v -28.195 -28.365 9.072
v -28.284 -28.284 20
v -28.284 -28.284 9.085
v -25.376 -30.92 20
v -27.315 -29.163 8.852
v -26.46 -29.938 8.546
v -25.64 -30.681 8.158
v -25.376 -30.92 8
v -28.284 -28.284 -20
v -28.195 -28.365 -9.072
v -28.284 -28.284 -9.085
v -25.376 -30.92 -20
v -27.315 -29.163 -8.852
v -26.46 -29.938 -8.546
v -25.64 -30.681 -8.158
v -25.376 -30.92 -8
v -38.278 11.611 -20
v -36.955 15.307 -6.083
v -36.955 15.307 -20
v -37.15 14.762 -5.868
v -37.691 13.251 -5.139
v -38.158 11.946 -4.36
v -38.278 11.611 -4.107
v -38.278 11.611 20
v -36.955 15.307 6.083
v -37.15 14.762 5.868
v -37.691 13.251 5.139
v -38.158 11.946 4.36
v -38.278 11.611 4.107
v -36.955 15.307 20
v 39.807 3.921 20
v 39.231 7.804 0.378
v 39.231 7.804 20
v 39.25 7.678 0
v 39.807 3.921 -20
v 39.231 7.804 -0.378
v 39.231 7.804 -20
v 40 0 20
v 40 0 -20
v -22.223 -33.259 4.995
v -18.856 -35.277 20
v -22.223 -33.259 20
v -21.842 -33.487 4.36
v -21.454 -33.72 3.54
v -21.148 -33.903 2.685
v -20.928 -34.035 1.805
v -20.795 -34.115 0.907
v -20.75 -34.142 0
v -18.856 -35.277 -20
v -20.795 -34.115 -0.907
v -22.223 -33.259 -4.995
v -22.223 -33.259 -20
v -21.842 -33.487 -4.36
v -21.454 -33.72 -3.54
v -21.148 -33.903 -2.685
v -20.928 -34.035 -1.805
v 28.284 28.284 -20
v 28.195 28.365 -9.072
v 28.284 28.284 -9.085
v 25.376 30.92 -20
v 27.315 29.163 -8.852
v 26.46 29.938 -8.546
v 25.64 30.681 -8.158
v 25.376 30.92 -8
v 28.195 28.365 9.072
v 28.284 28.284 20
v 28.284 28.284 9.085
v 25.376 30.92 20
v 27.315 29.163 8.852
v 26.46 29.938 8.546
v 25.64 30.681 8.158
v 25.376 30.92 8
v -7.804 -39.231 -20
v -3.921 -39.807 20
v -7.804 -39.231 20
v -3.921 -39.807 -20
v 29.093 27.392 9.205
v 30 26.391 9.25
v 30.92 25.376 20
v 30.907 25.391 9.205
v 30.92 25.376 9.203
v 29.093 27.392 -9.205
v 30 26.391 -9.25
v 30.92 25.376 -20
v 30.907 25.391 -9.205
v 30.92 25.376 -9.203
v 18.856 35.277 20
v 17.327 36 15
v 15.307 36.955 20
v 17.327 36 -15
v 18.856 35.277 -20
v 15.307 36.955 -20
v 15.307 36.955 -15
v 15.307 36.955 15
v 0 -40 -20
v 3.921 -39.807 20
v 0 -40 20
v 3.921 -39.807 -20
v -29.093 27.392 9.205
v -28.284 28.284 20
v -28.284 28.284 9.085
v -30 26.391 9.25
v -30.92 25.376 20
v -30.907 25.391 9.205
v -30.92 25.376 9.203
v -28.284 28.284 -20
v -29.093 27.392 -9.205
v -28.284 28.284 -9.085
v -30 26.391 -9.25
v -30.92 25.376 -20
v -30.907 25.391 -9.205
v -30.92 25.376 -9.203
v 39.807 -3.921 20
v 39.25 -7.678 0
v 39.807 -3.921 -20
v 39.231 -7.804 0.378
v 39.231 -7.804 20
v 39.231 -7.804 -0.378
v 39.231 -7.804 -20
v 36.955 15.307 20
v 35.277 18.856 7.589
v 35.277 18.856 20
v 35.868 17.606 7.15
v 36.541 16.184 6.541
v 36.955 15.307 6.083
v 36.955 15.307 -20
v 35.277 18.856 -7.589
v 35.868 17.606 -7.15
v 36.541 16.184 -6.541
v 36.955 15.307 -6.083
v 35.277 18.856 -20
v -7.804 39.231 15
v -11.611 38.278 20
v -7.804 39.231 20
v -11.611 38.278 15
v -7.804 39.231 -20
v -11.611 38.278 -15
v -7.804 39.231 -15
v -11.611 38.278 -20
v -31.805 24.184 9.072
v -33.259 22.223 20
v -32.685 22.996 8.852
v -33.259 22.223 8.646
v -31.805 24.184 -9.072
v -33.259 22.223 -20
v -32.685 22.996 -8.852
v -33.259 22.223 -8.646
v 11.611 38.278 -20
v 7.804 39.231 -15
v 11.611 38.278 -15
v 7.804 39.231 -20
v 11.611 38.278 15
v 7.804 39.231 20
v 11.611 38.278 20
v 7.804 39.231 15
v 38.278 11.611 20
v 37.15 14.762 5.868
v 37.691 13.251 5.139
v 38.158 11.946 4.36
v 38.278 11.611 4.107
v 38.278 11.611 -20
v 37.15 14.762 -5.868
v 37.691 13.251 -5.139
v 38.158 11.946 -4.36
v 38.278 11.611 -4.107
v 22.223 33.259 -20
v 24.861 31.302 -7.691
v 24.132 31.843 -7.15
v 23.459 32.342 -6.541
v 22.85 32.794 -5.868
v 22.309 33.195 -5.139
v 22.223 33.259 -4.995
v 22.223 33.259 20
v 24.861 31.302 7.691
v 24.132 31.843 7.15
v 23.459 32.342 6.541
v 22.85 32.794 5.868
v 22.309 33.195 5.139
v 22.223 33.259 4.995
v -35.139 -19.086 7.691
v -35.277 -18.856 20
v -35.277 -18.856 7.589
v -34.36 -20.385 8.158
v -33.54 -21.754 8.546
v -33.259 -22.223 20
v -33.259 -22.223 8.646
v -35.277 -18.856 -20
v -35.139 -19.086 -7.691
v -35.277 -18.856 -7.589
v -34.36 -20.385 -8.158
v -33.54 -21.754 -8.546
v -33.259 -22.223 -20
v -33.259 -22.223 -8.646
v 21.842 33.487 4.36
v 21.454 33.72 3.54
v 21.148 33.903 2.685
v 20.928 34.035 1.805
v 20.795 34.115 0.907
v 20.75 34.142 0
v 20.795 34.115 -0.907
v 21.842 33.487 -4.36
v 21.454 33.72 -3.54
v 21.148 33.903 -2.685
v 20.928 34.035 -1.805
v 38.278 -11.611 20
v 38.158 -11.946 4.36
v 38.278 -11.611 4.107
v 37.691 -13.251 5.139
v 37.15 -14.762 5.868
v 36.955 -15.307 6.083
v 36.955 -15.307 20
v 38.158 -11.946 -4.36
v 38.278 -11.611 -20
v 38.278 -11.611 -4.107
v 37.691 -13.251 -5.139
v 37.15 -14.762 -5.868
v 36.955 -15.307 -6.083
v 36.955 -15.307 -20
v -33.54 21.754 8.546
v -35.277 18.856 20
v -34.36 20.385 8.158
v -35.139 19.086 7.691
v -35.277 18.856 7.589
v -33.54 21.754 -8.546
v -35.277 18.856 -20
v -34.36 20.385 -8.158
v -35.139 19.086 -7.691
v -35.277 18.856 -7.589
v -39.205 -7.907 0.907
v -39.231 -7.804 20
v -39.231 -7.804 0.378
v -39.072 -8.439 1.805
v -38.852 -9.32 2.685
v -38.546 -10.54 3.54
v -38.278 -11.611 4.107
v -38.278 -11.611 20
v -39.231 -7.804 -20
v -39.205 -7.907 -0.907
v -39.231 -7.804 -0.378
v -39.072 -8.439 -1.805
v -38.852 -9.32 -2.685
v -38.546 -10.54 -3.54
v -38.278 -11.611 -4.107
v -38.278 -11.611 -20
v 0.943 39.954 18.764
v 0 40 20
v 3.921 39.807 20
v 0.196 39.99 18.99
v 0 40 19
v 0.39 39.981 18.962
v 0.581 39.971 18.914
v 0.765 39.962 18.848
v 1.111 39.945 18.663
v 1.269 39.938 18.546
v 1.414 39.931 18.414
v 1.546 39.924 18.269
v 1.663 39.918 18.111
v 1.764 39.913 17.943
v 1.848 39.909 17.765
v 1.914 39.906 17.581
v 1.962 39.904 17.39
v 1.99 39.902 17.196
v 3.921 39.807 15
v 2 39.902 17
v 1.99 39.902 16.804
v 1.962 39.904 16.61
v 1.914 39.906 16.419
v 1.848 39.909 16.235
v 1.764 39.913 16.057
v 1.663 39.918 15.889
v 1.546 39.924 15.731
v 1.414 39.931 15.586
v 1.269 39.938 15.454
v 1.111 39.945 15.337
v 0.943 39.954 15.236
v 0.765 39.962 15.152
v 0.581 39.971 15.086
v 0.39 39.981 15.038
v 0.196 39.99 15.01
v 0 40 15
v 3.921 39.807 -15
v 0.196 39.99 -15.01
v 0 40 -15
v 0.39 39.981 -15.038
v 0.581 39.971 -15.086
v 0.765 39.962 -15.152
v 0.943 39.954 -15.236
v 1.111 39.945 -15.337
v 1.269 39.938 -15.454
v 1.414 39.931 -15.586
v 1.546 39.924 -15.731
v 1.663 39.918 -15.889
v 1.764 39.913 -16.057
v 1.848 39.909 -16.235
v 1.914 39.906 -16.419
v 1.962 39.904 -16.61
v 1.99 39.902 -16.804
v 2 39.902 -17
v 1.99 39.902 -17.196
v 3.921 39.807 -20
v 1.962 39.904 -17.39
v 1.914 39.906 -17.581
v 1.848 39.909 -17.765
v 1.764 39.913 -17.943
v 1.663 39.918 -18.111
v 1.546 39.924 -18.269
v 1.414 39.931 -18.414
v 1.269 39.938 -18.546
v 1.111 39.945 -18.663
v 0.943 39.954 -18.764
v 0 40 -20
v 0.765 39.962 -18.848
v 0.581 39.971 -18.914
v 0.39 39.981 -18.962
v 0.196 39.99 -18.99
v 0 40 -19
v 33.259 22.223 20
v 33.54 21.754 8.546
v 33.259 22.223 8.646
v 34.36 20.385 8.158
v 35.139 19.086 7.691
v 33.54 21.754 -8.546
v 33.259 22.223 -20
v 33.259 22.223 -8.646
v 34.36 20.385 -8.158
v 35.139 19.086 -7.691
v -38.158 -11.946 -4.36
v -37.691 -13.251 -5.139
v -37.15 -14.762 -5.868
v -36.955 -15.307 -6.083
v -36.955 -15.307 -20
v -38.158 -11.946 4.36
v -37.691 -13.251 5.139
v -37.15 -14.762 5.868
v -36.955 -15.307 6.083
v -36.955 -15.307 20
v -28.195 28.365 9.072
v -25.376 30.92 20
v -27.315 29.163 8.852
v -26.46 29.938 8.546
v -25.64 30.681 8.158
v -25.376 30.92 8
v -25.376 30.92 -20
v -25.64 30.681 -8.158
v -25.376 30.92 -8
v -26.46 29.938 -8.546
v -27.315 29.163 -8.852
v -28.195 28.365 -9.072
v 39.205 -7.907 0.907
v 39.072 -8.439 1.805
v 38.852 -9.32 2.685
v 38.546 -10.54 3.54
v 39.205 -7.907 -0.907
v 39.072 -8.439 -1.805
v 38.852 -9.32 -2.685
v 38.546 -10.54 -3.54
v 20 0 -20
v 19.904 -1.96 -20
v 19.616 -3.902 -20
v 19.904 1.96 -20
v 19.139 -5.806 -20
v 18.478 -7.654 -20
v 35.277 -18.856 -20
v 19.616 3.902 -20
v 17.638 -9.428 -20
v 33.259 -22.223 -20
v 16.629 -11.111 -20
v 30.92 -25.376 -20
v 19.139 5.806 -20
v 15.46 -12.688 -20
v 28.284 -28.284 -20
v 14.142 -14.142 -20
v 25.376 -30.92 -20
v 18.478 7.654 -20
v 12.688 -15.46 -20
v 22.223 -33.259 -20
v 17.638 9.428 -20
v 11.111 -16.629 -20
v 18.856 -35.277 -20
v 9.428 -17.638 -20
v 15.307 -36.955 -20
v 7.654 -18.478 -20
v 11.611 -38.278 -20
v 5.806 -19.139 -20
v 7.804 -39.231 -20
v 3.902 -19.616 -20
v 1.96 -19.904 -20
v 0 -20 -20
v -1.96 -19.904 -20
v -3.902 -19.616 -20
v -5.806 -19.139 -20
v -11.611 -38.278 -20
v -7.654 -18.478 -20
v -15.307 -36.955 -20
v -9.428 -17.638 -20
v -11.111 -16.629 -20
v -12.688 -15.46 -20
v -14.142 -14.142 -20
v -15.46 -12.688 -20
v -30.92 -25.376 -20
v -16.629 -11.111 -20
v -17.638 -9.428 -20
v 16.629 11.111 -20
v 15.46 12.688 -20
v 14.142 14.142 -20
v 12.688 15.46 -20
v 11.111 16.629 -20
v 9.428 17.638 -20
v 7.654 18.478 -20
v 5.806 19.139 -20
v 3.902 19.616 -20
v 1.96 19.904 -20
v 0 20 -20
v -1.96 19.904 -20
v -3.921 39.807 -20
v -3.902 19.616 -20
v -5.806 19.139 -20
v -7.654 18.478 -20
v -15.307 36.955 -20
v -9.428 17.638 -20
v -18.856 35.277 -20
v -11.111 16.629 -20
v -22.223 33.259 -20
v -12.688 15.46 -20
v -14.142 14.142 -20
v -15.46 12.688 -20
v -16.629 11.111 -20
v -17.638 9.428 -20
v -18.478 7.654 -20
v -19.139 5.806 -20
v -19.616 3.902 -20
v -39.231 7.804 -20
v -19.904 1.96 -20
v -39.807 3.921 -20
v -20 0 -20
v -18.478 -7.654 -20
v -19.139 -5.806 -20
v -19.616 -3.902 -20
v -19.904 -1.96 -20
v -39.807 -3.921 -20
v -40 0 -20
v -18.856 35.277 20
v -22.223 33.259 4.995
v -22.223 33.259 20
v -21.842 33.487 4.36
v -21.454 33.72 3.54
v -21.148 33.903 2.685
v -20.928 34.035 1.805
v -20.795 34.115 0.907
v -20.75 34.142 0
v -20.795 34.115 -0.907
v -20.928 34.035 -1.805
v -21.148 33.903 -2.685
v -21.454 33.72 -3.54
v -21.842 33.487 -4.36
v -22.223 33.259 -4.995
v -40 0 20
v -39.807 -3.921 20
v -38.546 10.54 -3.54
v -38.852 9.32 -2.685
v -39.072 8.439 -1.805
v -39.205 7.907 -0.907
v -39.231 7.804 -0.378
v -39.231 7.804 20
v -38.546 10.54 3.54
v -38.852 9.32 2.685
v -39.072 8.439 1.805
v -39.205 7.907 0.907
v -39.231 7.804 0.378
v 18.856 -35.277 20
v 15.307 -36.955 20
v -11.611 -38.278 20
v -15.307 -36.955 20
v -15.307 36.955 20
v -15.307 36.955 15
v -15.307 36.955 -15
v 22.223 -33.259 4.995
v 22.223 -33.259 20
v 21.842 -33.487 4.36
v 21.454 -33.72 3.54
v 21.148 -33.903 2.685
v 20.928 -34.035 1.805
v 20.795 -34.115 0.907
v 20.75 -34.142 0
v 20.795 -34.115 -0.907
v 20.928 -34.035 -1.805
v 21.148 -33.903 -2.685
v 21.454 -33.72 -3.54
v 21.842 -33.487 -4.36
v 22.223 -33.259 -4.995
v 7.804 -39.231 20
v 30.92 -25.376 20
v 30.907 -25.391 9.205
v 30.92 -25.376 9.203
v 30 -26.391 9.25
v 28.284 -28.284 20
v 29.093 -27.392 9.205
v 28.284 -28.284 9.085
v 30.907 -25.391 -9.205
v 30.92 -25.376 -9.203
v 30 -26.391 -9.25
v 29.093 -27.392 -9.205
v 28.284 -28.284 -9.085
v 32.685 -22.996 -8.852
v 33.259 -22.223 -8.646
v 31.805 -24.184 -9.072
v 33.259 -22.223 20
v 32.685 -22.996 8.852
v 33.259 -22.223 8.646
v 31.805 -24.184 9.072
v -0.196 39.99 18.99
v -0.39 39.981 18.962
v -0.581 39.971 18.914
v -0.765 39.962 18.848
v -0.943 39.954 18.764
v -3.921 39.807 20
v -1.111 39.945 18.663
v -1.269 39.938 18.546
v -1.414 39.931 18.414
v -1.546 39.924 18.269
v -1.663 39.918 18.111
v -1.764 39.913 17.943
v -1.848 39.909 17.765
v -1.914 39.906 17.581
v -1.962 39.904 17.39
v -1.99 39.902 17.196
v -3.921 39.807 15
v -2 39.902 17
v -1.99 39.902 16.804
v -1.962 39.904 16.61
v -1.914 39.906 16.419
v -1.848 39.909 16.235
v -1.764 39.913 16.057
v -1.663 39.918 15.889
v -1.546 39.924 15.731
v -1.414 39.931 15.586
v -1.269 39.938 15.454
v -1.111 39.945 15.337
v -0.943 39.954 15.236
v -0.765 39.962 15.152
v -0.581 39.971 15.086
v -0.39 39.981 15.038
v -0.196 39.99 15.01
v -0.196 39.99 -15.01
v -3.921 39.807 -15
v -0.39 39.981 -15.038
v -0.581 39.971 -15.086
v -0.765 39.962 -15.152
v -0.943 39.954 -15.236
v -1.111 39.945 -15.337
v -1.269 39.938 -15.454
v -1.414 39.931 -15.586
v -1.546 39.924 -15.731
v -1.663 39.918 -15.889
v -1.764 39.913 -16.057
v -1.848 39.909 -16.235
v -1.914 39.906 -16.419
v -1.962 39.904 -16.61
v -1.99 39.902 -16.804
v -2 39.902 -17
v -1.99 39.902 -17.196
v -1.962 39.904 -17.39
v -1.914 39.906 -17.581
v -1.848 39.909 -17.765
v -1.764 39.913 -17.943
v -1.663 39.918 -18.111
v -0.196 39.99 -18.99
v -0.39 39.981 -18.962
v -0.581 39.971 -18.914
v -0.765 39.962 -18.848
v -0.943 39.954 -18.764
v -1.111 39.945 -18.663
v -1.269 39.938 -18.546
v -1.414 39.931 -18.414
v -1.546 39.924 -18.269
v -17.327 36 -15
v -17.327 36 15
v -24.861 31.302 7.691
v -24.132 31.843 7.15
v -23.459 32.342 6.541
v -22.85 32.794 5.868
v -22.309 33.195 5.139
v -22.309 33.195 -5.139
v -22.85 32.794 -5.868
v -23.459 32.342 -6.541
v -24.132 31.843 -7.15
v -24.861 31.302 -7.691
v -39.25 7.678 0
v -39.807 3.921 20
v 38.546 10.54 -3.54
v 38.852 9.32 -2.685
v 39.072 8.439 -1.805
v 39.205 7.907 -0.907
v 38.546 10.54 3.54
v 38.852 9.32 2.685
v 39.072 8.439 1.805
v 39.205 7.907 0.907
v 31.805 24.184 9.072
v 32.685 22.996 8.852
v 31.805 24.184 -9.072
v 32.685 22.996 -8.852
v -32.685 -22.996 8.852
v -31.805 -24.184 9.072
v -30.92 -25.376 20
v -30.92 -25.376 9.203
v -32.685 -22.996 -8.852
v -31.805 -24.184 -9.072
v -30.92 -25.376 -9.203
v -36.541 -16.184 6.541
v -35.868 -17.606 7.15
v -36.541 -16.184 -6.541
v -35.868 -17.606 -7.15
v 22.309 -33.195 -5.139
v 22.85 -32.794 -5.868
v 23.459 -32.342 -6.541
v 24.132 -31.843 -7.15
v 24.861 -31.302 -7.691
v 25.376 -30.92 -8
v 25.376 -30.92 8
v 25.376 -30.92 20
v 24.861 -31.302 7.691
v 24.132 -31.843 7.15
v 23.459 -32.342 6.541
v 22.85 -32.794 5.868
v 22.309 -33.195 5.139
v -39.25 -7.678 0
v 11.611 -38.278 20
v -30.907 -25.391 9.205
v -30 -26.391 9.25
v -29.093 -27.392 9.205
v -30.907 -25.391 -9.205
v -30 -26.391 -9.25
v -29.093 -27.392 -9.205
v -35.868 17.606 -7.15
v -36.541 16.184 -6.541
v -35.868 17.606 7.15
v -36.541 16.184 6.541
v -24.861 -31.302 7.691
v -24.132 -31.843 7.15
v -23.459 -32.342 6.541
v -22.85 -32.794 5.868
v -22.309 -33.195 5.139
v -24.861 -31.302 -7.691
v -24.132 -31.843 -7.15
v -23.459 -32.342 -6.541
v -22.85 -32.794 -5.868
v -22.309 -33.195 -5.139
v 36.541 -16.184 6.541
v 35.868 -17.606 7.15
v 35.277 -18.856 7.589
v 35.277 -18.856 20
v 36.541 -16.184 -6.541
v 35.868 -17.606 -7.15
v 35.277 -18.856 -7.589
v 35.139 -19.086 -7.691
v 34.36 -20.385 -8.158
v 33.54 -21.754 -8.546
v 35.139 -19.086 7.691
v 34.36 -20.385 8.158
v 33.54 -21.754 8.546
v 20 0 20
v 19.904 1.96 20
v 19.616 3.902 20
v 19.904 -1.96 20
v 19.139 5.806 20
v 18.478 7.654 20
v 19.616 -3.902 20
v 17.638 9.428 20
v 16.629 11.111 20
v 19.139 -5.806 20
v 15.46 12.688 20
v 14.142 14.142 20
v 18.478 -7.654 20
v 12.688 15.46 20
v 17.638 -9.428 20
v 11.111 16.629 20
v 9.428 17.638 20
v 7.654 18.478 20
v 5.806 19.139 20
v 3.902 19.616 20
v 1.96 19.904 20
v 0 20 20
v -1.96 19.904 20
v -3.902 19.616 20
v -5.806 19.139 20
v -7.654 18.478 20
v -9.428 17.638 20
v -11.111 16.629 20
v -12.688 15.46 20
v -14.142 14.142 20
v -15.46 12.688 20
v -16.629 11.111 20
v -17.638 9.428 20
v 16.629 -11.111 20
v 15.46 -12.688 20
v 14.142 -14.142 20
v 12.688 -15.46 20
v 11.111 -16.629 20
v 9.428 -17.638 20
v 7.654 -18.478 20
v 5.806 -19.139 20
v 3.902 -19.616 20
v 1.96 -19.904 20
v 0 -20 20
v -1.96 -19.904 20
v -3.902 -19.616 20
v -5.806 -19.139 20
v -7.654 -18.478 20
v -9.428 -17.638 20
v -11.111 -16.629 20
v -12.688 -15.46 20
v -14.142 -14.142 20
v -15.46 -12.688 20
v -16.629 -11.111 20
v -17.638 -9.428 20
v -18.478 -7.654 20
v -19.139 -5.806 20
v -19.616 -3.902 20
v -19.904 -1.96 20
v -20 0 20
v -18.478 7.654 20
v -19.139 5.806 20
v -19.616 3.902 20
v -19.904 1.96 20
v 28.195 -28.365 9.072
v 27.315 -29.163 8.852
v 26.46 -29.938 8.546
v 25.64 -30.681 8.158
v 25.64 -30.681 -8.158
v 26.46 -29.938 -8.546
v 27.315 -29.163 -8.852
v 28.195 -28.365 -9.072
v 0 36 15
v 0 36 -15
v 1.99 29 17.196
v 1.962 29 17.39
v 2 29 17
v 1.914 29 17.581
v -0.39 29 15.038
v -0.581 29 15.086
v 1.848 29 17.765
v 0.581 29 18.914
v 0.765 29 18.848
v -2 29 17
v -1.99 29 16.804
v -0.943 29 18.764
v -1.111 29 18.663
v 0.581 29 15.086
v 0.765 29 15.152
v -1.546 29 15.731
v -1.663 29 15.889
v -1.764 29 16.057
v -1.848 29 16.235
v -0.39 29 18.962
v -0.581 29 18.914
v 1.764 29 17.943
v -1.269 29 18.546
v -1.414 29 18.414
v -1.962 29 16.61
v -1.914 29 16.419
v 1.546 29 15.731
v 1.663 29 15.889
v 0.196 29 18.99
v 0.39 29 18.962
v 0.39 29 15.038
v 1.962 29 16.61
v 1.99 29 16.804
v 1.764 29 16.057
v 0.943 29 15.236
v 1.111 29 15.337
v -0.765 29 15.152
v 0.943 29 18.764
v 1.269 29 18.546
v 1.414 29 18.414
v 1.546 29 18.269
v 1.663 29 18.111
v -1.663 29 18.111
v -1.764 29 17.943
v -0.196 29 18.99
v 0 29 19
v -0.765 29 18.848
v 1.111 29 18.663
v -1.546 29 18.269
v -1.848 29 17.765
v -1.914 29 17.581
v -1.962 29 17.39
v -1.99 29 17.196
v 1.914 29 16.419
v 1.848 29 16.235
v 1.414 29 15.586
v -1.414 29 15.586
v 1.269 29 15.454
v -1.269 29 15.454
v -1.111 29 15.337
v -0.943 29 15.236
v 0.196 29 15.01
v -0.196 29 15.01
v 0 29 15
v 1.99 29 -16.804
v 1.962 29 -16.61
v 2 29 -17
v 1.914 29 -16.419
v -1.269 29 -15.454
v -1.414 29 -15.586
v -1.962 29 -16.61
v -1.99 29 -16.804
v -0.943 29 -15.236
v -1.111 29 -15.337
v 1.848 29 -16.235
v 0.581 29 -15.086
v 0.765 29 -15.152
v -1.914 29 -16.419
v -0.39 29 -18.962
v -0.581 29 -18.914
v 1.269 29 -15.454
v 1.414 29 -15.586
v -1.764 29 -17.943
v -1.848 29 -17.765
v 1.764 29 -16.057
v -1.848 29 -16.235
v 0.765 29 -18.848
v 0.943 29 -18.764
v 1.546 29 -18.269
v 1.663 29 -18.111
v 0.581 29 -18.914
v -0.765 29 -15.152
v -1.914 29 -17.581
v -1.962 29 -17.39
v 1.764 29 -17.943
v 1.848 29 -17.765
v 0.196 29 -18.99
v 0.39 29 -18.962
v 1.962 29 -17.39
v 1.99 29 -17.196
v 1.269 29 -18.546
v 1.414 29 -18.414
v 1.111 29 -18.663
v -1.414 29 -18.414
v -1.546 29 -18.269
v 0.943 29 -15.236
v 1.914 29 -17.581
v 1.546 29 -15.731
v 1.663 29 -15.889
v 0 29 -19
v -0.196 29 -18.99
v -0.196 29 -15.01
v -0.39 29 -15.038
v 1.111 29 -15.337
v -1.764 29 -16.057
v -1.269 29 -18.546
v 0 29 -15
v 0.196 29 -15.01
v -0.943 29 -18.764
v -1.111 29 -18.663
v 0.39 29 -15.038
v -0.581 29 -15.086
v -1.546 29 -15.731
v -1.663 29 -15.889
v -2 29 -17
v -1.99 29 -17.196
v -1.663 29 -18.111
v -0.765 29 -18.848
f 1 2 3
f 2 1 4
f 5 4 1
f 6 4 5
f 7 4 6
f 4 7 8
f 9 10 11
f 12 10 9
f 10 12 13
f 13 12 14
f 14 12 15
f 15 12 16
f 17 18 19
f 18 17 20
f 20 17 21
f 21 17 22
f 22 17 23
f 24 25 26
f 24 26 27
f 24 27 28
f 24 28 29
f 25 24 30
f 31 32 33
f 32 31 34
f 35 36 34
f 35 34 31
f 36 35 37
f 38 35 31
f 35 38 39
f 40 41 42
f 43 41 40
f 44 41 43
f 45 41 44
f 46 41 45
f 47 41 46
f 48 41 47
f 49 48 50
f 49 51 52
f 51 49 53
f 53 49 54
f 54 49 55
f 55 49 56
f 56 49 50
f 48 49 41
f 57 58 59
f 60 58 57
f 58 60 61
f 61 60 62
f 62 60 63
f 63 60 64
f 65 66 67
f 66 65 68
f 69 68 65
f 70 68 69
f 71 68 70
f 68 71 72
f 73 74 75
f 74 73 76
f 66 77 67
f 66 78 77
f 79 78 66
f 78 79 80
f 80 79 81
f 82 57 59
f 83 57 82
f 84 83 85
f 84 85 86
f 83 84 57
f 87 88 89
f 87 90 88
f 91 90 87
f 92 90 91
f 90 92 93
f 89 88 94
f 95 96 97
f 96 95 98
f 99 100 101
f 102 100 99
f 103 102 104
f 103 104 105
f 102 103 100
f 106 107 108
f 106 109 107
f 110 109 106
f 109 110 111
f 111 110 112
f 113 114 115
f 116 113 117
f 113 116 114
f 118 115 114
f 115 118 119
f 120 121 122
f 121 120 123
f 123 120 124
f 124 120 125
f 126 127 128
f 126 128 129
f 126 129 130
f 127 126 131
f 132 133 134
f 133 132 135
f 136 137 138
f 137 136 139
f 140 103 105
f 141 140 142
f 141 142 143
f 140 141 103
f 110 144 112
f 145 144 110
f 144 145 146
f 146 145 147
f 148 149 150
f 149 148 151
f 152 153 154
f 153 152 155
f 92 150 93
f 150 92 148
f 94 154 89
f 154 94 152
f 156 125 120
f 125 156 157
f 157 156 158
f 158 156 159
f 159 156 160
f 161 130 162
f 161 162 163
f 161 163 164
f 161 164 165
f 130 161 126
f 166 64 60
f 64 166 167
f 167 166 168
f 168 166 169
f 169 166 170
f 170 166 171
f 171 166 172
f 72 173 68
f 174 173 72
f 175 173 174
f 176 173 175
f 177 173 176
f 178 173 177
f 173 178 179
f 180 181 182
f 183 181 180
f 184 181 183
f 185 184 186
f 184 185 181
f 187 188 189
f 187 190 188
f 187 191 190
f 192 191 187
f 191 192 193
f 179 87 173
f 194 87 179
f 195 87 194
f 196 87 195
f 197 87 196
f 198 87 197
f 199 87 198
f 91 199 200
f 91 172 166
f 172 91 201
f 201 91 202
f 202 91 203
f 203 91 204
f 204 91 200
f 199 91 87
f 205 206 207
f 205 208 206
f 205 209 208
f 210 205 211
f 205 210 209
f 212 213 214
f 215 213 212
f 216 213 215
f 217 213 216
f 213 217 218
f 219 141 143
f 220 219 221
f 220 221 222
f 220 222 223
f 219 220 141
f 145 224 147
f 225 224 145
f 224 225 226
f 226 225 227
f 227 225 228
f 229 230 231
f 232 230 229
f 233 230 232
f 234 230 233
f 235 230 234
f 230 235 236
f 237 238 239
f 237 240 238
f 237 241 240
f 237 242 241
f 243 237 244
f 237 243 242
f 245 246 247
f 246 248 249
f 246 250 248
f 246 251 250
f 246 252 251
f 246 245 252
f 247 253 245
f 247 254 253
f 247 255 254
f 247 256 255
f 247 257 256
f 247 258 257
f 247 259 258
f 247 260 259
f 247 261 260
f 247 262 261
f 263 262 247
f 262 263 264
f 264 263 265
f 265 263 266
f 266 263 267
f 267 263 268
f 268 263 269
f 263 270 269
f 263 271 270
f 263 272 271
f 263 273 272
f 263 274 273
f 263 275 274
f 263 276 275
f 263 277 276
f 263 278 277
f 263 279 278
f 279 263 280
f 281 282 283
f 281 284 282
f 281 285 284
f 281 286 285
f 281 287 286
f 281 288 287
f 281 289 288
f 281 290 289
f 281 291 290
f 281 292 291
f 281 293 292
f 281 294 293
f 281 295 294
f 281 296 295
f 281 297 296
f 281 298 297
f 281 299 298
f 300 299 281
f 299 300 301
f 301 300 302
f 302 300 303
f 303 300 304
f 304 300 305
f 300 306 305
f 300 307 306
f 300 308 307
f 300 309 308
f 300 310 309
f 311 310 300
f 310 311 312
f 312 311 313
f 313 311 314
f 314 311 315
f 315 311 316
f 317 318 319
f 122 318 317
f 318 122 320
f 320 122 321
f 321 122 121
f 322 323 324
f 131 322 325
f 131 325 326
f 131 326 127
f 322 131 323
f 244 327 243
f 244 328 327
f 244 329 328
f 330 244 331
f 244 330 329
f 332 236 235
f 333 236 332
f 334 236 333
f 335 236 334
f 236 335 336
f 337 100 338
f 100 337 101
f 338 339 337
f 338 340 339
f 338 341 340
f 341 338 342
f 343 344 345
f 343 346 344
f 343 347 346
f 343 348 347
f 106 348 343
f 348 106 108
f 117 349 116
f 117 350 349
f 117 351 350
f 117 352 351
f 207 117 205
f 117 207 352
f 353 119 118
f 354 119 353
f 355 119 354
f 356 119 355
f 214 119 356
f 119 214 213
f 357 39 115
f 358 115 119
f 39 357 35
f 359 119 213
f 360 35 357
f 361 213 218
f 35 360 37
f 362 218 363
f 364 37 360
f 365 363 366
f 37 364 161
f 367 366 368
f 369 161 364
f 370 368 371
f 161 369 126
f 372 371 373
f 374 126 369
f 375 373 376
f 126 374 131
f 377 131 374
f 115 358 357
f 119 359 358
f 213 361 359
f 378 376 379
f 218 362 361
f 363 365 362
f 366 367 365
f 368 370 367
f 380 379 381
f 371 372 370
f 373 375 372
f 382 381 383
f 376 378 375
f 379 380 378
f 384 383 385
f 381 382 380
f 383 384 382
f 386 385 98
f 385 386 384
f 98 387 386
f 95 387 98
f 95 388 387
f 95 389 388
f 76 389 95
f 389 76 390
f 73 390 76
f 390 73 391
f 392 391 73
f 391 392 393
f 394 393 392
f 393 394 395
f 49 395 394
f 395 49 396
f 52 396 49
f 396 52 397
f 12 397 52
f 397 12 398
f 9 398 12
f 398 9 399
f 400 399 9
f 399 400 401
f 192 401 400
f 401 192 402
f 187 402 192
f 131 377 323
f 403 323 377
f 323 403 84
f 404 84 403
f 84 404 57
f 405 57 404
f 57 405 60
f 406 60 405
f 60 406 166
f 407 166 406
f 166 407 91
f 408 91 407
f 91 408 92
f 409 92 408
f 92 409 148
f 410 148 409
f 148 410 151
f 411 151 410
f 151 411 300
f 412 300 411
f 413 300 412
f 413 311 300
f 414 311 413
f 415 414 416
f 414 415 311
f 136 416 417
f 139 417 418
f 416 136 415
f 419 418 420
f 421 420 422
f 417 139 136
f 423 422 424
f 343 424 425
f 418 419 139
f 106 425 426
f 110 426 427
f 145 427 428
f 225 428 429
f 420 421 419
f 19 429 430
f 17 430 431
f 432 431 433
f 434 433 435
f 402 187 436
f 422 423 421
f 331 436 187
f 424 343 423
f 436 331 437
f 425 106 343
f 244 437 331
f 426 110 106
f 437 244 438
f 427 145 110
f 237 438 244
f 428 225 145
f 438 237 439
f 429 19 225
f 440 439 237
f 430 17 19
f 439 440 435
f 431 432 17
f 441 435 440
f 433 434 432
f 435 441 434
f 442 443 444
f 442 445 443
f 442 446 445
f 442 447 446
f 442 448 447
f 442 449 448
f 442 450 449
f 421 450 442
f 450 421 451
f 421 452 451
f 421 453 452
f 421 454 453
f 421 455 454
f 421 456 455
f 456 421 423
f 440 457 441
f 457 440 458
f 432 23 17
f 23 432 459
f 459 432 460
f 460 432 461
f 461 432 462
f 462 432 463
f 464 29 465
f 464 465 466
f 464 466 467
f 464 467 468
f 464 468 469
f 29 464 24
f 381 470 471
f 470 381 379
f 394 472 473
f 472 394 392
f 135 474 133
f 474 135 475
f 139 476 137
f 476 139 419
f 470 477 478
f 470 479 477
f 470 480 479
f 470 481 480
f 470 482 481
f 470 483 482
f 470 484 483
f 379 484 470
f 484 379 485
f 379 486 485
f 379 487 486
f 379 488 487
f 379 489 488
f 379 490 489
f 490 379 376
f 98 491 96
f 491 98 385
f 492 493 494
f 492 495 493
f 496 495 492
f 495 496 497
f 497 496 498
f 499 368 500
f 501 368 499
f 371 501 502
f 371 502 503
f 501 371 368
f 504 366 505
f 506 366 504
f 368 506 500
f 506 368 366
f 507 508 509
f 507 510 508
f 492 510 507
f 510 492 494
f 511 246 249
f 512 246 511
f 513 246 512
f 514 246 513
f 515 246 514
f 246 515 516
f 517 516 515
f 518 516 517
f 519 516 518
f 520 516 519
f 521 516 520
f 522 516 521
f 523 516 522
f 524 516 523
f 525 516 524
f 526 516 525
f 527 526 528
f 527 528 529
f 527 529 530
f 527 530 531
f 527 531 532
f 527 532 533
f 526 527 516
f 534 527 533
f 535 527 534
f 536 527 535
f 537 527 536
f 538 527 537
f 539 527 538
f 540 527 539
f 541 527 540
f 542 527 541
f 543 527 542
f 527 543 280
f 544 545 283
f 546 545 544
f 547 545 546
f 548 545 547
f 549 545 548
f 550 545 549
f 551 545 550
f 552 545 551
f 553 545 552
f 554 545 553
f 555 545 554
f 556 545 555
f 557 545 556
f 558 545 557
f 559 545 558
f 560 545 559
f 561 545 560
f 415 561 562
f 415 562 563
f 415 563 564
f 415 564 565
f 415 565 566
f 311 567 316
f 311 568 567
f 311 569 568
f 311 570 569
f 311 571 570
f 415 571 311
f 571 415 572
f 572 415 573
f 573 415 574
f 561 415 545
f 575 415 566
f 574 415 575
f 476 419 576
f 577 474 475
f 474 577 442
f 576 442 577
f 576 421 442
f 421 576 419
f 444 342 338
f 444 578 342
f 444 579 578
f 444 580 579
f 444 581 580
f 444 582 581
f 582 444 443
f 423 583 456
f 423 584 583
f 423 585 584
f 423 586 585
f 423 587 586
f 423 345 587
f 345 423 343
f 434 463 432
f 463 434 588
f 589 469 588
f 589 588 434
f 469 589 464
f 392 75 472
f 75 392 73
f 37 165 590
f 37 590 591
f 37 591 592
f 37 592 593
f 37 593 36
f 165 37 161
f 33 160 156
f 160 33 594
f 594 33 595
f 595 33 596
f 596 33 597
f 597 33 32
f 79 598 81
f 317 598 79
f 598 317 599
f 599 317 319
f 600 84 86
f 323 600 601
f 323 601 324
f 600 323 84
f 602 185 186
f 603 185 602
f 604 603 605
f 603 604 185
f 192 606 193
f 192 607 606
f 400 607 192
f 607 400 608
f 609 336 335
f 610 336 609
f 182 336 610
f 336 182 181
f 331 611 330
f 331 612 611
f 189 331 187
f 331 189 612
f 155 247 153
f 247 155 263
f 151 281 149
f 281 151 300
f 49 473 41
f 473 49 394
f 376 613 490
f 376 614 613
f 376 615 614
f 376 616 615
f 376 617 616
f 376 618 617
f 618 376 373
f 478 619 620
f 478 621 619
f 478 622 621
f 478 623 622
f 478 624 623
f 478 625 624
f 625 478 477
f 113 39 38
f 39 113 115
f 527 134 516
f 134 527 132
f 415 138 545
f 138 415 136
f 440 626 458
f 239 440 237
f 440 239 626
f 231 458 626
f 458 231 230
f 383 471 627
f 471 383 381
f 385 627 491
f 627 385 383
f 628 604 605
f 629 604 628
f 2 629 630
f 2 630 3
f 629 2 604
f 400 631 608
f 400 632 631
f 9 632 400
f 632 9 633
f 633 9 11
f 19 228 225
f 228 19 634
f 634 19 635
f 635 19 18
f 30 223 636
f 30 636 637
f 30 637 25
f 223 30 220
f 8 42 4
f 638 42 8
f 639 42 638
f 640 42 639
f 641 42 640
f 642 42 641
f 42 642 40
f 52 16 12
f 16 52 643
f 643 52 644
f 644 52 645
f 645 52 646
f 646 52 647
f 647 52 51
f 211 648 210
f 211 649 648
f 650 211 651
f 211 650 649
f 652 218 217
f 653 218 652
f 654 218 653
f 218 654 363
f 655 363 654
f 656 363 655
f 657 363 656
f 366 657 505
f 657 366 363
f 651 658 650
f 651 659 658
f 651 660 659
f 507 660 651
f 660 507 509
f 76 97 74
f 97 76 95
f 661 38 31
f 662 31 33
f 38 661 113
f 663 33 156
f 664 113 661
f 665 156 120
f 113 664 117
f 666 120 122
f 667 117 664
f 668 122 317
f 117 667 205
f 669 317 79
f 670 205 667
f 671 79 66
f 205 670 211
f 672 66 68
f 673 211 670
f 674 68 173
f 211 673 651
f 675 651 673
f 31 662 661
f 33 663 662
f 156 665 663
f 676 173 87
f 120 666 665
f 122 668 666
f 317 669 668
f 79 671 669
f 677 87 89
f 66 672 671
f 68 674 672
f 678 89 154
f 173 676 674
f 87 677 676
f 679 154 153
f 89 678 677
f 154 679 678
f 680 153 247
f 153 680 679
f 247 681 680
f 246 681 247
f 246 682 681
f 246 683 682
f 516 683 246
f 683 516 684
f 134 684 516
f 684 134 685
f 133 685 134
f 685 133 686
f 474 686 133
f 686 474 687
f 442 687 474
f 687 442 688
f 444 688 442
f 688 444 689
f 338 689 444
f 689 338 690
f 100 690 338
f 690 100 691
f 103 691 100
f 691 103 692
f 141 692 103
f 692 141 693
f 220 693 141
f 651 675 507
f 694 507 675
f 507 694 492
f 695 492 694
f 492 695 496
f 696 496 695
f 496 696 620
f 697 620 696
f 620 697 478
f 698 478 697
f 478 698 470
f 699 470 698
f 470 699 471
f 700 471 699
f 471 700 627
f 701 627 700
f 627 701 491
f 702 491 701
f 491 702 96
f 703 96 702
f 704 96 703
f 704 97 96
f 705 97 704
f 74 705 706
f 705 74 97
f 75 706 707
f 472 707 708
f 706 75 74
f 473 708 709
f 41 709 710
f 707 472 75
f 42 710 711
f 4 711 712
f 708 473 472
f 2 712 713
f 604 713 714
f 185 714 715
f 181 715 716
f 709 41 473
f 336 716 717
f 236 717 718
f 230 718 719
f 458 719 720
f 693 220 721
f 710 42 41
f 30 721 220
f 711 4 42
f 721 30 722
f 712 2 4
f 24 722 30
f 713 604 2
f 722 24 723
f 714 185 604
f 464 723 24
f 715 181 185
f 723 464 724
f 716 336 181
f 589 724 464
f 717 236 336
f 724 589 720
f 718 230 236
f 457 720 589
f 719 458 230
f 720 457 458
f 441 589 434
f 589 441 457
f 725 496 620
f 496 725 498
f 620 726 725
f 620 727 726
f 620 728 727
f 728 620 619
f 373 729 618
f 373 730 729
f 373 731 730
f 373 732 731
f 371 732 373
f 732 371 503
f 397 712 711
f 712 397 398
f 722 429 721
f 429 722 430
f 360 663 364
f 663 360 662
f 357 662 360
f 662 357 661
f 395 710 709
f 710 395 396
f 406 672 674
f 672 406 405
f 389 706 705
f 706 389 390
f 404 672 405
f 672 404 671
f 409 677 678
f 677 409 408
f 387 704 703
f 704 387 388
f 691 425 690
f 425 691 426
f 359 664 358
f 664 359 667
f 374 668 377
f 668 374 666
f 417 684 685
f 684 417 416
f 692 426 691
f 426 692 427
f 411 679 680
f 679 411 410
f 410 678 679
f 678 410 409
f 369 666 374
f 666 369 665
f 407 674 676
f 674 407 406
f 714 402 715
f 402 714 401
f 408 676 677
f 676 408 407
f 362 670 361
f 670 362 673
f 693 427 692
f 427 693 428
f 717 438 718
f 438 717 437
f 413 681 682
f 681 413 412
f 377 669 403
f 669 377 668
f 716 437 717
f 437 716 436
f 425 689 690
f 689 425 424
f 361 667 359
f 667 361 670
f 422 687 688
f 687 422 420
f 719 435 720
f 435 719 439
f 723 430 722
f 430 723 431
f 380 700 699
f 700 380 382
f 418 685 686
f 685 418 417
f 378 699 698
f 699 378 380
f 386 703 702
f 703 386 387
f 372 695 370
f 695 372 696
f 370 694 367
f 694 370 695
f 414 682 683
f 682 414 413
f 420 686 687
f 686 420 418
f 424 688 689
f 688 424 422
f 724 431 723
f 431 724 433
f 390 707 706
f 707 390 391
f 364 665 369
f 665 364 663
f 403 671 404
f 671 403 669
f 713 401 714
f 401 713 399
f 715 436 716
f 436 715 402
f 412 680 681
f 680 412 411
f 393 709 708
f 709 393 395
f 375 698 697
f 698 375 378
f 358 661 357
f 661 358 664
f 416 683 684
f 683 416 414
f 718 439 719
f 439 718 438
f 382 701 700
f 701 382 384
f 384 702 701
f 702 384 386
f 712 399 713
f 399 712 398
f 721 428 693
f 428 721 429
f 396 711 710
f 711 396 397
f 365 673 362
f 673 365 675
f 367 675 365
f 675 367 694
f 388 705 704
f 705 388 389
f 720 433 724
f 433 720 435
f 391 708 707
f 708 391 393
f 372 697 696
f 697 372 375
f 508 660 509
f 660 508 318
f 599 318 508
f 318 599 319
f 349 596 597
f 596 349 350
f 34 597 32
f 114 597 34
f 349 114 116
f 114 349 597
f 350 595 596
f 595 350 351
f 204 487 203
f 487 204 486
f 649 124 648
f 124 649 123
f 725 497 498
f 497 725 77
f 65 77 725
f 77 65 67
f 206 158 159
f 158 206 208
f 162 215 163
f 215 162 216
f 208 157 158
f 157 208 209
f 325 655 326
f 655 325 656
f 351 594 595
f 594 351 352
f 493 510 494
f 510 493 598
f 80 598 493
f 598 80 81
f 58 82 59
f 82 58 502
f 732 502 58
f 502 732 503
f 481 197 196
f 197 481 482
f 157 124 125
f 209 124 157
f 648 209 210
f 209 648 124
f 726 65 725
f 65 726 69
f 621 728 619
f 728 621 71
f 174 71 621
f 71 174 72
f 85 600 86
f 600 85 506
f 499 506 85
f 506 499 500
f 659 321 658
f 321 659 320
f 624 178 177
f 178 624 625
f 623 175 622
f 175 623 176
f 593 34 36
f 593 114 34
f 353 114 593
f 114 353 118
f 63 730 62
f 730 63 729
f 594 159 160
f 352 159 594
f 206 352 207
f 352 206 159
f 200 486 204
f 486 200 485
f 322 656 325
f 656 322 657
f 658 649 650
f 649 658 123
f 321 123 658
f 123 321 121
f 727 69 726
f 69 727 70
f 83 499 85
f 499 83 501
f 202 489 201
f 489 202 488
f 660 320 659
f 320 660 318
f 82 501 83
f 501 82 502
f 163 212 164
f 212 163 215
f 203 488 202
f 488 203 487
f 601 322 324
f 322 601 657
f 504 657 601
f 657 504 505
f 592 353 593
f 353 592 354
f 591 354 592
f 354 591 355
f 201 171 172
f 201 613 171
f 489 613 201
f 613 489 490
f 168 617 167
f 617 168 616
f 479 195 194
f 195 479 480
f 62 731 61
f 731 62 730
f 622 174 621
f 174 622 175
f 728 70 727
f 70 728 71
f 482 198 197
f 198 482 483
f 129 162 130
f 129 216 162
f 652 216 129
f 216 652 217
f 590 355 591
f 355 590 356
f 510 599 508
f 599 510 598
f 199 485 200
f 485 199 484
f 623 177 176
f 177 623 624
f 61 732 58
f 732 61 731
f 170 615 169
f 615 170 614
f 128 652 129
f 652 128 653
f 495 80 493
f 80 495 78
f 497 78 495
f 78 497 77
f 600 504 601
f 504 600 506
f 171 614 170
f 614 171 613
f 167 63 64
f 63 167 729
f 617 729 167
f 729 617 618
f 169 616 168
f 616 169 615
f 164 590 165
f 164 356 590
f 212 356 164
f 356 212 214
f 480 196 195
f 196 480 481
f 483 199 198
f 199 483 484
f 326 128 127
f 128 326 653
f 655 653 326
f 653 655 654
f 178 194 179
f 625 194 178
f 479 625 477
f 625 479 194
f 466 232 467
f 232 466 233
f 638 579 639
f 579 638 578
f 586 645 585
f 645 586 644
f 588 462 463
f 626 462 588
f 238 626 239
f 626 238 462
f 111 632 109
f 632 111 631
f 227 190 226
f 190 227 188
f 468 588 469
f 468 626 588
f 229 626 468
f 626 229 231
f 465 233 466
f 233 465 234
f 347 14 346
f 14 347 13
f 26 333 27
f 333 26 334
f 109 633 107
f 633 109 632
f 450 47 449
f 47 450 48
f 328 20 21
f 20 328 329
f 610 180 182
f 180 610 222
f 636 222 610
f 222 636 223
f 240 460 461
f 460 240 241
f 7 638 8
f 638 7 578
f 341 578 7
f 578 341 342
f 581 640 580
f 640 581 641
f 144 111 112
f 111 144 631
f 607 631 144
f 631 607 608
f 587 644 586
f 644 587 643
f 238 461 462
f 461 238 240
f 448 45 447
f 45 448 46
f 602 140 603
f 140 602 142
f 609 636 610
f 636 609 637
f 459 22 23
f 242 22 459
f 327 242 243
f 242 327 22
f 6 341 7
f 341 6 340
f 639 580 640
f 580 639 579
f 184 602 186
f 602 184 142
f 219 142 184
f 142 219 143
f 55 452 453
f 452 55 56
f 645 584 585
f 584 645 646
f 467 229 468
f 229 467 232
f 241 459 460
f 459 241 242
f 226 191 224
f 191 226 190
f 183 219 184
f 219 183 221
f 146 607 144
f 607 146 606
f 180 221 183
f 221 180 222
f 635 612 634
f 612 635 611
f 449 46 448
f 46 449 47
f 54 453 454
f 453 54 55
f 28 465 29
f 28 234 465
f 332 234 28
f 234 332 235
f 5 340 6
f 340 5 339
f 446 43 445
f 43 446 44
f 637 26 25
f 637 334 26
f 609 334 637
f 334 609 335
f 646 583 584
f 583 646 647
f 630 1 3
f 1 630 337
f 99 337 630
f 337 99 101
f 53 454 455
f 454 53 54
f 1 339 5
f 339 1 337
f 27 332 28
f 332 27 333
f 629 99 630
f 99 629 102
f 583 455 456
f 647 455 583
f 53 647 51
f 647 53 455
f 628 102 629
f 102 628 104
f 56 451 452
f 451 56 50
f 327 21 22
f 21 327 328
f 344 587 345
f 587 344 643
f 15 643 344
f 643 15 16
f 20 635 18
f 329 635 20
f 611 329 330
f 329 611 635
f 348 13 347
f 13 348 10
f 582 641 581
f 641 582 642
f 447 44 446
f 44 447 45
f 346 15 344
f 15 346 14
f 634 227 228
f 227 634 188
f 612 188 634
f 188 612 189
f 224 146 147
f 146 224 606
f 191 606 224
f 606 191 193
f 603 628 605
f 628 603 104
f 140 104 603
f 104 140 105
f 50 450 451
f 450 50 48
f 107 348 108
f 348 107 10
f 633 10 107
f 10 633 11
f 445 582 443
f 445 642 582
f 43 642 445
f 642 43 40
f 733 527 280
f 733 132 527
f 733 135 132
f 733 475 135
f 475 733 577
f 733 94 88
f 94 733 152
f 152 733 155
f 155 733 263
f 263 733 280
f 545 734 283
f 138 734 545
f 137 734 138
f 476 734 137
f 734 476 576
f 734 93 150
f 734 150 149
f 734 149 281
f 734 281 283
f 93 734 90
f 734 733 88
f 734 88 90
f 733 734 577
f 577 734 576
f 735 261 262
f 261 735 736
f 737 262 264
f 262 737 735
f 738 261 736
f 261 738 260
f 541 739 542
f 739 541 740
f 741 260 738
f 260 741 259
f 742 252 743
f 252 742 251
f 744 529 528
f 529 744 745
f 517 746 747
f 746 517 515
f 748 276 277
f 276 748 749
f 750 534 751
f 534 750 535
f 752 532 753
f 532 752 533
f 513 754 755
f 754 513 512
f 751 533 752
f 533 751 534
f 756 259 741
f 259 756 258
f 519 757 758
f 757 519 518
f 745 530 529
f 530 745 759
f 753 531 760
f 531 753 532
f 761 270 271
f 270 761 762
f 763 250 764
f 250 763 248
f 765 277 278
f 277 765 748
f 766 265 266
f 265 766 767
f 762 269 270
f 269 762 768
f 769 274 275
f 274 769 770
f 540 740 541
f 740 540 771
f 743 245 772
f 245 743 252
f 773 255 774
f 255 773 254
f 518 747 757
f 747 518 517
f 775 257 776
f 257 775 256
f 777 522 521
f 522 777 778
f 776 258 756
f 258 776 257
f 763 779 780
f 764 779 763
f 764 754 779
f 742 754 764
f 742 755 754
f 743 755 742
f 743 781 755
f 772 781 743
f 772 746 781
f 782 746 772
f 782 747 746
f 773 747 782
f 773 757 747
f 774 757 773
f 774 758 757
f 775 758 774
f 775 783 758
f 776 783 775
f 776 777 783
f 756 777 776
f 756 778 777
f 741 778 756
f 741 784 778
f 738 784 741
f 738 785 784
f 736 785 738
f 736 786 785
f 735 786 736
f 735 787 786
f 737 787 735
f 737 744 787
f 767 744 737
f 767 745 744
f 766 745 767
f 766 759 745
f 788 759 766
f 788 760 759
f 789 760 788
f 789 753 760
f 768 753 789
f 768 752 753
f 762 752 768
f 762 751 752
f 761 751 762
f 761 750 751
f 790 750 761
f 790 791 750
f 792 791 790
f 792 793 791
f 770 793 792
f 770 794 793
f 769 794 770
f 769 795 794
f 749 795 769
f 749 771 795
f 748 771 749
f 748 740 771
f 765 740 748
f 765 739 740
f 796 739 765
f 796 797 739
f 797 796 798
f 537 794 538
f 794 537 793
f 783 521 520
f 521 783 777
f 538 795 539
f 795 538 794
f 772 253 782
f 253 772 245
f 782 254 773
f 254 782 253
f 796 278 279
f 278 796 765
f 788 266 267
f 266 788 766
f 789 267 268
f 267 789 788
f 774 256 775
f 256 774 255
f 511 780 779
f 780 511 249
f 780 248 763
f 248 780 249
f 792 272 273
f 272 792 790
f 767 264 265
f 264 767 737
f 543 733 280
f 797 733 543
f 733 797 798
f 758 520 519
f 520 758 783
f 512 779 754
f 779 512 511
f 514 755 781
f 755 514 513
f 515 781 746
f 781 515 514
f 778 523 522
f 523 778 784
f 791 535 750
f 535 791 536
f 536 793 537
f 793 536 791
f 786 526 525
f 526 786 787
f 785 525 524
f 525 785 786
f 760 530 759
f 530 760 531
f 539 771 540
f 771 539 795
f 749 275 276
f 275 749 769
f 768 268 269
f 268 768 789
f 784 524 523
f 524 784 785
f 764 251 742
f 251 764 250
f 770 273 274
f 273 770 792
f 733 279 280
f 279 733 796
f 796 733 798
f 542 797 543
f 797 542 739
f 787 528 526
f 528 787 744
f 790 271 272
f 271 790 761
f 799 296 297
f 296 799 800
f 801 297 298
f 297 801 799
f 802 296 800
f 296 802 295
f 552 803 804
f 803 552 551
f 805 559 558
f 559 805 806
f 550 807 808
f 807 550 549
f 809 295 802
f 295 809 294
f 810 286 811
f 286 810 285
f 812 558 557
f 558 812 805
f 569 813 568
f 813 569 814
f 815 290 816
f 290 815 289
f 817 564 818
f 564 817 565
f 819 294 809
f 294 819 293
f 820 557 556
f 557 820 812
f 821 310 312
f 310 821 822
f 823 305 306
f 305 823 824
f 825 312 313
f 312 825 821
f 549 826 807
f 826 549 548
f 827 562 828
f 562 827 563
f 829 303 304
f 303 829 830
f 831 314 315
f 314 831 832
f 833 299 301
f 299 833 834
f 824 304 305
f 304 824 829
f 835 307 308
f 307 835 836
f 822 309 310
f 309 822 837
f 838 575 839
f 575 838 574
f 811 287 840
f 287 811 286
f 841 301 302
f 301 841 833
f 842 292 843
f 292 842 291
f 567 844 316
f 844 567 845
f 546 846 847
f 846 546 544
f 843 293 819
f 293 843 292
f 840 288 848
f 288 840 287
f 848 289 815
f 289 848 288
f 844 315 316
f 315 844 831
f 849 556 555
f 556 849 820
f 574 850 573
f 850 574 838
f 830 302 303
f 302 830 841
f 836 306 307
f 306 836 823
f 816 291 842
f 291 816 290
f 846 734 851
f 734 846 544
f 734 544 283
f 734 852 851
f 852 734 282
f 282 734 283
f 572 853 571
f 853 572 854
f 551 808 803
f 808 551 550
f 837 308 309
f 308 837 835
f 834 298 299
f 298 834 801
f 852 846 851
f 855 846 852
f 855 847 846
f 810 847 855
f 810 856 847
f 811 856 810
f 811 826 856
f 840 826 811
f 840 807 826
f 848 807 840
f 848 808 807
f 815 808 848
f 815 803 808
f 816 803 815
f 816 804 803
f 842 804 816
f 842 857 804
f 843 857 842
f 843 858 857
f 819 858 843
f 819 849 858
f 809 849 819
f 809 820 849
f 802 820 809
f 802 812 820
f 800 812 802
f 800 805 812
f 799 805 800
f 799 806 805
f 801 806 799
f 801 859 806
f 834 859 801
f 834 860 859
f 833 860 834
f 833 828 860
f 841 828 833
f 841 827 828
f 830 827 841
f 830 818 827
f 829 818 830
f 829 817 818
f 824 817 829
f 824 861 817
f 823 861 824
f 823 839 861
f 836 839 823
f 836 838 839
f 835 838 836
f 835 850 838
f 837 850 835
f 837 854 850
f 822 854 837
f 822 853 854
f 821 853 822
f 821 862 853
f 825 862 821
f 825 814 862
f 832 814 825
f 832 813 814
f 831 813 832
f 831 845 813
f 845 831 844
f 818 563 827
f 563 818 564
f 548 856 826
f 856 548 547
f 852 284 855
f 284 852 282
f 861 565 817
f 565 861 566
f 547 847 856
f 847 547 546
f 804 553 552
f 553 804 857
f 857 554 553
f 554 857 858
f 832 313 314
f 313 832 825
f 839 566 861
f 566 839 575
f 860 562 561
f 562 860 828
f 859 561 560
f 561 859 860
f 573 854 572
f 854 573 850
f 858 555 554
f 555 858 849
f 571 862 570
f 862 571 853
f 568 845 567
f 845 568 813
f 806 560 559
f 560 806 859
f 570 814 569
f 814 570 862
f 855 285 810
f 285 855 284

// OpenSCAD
// COBRA Vertebra - T8 V14
// Height: 40.0mm, OD: 80.0mm

$fn = 64;

difference() {
    // Outer cylinder
    cylinder(h=40.0, d=80.0, center=true);
    
    // Inner channel
    cylinder(h=42.0, d=40.0, center=true);

    // Battery cavity 1
    rotate([0, 0, 0])
    translate([30.0, 0, 0])
    rotate([90, 0, 0])
    cylinder(h=74.0, d=18.5, center=true);

    // Battery cavity 2
    rotate([0, 0, 180])
    translate([30.0, 0, 0])
    rotate([90, 0, 0])
    cylinder(h=74.0, d=18.5, center=true);

    // Solar panel cavity
    translate([0, 38.0, 0])
    cube([50, 4, 30], center=true);

    // Pivot holes
    translate([0, 40.0, 17.0])
    rotate([90, 0, 0])
    cylinder(h=22.0, d=4, center=true);
    
    translate([0, 40.0, -17.0])
    rotate([90, 0, 0])
    cylinder(h=22.0, d=4, center=true);
}
